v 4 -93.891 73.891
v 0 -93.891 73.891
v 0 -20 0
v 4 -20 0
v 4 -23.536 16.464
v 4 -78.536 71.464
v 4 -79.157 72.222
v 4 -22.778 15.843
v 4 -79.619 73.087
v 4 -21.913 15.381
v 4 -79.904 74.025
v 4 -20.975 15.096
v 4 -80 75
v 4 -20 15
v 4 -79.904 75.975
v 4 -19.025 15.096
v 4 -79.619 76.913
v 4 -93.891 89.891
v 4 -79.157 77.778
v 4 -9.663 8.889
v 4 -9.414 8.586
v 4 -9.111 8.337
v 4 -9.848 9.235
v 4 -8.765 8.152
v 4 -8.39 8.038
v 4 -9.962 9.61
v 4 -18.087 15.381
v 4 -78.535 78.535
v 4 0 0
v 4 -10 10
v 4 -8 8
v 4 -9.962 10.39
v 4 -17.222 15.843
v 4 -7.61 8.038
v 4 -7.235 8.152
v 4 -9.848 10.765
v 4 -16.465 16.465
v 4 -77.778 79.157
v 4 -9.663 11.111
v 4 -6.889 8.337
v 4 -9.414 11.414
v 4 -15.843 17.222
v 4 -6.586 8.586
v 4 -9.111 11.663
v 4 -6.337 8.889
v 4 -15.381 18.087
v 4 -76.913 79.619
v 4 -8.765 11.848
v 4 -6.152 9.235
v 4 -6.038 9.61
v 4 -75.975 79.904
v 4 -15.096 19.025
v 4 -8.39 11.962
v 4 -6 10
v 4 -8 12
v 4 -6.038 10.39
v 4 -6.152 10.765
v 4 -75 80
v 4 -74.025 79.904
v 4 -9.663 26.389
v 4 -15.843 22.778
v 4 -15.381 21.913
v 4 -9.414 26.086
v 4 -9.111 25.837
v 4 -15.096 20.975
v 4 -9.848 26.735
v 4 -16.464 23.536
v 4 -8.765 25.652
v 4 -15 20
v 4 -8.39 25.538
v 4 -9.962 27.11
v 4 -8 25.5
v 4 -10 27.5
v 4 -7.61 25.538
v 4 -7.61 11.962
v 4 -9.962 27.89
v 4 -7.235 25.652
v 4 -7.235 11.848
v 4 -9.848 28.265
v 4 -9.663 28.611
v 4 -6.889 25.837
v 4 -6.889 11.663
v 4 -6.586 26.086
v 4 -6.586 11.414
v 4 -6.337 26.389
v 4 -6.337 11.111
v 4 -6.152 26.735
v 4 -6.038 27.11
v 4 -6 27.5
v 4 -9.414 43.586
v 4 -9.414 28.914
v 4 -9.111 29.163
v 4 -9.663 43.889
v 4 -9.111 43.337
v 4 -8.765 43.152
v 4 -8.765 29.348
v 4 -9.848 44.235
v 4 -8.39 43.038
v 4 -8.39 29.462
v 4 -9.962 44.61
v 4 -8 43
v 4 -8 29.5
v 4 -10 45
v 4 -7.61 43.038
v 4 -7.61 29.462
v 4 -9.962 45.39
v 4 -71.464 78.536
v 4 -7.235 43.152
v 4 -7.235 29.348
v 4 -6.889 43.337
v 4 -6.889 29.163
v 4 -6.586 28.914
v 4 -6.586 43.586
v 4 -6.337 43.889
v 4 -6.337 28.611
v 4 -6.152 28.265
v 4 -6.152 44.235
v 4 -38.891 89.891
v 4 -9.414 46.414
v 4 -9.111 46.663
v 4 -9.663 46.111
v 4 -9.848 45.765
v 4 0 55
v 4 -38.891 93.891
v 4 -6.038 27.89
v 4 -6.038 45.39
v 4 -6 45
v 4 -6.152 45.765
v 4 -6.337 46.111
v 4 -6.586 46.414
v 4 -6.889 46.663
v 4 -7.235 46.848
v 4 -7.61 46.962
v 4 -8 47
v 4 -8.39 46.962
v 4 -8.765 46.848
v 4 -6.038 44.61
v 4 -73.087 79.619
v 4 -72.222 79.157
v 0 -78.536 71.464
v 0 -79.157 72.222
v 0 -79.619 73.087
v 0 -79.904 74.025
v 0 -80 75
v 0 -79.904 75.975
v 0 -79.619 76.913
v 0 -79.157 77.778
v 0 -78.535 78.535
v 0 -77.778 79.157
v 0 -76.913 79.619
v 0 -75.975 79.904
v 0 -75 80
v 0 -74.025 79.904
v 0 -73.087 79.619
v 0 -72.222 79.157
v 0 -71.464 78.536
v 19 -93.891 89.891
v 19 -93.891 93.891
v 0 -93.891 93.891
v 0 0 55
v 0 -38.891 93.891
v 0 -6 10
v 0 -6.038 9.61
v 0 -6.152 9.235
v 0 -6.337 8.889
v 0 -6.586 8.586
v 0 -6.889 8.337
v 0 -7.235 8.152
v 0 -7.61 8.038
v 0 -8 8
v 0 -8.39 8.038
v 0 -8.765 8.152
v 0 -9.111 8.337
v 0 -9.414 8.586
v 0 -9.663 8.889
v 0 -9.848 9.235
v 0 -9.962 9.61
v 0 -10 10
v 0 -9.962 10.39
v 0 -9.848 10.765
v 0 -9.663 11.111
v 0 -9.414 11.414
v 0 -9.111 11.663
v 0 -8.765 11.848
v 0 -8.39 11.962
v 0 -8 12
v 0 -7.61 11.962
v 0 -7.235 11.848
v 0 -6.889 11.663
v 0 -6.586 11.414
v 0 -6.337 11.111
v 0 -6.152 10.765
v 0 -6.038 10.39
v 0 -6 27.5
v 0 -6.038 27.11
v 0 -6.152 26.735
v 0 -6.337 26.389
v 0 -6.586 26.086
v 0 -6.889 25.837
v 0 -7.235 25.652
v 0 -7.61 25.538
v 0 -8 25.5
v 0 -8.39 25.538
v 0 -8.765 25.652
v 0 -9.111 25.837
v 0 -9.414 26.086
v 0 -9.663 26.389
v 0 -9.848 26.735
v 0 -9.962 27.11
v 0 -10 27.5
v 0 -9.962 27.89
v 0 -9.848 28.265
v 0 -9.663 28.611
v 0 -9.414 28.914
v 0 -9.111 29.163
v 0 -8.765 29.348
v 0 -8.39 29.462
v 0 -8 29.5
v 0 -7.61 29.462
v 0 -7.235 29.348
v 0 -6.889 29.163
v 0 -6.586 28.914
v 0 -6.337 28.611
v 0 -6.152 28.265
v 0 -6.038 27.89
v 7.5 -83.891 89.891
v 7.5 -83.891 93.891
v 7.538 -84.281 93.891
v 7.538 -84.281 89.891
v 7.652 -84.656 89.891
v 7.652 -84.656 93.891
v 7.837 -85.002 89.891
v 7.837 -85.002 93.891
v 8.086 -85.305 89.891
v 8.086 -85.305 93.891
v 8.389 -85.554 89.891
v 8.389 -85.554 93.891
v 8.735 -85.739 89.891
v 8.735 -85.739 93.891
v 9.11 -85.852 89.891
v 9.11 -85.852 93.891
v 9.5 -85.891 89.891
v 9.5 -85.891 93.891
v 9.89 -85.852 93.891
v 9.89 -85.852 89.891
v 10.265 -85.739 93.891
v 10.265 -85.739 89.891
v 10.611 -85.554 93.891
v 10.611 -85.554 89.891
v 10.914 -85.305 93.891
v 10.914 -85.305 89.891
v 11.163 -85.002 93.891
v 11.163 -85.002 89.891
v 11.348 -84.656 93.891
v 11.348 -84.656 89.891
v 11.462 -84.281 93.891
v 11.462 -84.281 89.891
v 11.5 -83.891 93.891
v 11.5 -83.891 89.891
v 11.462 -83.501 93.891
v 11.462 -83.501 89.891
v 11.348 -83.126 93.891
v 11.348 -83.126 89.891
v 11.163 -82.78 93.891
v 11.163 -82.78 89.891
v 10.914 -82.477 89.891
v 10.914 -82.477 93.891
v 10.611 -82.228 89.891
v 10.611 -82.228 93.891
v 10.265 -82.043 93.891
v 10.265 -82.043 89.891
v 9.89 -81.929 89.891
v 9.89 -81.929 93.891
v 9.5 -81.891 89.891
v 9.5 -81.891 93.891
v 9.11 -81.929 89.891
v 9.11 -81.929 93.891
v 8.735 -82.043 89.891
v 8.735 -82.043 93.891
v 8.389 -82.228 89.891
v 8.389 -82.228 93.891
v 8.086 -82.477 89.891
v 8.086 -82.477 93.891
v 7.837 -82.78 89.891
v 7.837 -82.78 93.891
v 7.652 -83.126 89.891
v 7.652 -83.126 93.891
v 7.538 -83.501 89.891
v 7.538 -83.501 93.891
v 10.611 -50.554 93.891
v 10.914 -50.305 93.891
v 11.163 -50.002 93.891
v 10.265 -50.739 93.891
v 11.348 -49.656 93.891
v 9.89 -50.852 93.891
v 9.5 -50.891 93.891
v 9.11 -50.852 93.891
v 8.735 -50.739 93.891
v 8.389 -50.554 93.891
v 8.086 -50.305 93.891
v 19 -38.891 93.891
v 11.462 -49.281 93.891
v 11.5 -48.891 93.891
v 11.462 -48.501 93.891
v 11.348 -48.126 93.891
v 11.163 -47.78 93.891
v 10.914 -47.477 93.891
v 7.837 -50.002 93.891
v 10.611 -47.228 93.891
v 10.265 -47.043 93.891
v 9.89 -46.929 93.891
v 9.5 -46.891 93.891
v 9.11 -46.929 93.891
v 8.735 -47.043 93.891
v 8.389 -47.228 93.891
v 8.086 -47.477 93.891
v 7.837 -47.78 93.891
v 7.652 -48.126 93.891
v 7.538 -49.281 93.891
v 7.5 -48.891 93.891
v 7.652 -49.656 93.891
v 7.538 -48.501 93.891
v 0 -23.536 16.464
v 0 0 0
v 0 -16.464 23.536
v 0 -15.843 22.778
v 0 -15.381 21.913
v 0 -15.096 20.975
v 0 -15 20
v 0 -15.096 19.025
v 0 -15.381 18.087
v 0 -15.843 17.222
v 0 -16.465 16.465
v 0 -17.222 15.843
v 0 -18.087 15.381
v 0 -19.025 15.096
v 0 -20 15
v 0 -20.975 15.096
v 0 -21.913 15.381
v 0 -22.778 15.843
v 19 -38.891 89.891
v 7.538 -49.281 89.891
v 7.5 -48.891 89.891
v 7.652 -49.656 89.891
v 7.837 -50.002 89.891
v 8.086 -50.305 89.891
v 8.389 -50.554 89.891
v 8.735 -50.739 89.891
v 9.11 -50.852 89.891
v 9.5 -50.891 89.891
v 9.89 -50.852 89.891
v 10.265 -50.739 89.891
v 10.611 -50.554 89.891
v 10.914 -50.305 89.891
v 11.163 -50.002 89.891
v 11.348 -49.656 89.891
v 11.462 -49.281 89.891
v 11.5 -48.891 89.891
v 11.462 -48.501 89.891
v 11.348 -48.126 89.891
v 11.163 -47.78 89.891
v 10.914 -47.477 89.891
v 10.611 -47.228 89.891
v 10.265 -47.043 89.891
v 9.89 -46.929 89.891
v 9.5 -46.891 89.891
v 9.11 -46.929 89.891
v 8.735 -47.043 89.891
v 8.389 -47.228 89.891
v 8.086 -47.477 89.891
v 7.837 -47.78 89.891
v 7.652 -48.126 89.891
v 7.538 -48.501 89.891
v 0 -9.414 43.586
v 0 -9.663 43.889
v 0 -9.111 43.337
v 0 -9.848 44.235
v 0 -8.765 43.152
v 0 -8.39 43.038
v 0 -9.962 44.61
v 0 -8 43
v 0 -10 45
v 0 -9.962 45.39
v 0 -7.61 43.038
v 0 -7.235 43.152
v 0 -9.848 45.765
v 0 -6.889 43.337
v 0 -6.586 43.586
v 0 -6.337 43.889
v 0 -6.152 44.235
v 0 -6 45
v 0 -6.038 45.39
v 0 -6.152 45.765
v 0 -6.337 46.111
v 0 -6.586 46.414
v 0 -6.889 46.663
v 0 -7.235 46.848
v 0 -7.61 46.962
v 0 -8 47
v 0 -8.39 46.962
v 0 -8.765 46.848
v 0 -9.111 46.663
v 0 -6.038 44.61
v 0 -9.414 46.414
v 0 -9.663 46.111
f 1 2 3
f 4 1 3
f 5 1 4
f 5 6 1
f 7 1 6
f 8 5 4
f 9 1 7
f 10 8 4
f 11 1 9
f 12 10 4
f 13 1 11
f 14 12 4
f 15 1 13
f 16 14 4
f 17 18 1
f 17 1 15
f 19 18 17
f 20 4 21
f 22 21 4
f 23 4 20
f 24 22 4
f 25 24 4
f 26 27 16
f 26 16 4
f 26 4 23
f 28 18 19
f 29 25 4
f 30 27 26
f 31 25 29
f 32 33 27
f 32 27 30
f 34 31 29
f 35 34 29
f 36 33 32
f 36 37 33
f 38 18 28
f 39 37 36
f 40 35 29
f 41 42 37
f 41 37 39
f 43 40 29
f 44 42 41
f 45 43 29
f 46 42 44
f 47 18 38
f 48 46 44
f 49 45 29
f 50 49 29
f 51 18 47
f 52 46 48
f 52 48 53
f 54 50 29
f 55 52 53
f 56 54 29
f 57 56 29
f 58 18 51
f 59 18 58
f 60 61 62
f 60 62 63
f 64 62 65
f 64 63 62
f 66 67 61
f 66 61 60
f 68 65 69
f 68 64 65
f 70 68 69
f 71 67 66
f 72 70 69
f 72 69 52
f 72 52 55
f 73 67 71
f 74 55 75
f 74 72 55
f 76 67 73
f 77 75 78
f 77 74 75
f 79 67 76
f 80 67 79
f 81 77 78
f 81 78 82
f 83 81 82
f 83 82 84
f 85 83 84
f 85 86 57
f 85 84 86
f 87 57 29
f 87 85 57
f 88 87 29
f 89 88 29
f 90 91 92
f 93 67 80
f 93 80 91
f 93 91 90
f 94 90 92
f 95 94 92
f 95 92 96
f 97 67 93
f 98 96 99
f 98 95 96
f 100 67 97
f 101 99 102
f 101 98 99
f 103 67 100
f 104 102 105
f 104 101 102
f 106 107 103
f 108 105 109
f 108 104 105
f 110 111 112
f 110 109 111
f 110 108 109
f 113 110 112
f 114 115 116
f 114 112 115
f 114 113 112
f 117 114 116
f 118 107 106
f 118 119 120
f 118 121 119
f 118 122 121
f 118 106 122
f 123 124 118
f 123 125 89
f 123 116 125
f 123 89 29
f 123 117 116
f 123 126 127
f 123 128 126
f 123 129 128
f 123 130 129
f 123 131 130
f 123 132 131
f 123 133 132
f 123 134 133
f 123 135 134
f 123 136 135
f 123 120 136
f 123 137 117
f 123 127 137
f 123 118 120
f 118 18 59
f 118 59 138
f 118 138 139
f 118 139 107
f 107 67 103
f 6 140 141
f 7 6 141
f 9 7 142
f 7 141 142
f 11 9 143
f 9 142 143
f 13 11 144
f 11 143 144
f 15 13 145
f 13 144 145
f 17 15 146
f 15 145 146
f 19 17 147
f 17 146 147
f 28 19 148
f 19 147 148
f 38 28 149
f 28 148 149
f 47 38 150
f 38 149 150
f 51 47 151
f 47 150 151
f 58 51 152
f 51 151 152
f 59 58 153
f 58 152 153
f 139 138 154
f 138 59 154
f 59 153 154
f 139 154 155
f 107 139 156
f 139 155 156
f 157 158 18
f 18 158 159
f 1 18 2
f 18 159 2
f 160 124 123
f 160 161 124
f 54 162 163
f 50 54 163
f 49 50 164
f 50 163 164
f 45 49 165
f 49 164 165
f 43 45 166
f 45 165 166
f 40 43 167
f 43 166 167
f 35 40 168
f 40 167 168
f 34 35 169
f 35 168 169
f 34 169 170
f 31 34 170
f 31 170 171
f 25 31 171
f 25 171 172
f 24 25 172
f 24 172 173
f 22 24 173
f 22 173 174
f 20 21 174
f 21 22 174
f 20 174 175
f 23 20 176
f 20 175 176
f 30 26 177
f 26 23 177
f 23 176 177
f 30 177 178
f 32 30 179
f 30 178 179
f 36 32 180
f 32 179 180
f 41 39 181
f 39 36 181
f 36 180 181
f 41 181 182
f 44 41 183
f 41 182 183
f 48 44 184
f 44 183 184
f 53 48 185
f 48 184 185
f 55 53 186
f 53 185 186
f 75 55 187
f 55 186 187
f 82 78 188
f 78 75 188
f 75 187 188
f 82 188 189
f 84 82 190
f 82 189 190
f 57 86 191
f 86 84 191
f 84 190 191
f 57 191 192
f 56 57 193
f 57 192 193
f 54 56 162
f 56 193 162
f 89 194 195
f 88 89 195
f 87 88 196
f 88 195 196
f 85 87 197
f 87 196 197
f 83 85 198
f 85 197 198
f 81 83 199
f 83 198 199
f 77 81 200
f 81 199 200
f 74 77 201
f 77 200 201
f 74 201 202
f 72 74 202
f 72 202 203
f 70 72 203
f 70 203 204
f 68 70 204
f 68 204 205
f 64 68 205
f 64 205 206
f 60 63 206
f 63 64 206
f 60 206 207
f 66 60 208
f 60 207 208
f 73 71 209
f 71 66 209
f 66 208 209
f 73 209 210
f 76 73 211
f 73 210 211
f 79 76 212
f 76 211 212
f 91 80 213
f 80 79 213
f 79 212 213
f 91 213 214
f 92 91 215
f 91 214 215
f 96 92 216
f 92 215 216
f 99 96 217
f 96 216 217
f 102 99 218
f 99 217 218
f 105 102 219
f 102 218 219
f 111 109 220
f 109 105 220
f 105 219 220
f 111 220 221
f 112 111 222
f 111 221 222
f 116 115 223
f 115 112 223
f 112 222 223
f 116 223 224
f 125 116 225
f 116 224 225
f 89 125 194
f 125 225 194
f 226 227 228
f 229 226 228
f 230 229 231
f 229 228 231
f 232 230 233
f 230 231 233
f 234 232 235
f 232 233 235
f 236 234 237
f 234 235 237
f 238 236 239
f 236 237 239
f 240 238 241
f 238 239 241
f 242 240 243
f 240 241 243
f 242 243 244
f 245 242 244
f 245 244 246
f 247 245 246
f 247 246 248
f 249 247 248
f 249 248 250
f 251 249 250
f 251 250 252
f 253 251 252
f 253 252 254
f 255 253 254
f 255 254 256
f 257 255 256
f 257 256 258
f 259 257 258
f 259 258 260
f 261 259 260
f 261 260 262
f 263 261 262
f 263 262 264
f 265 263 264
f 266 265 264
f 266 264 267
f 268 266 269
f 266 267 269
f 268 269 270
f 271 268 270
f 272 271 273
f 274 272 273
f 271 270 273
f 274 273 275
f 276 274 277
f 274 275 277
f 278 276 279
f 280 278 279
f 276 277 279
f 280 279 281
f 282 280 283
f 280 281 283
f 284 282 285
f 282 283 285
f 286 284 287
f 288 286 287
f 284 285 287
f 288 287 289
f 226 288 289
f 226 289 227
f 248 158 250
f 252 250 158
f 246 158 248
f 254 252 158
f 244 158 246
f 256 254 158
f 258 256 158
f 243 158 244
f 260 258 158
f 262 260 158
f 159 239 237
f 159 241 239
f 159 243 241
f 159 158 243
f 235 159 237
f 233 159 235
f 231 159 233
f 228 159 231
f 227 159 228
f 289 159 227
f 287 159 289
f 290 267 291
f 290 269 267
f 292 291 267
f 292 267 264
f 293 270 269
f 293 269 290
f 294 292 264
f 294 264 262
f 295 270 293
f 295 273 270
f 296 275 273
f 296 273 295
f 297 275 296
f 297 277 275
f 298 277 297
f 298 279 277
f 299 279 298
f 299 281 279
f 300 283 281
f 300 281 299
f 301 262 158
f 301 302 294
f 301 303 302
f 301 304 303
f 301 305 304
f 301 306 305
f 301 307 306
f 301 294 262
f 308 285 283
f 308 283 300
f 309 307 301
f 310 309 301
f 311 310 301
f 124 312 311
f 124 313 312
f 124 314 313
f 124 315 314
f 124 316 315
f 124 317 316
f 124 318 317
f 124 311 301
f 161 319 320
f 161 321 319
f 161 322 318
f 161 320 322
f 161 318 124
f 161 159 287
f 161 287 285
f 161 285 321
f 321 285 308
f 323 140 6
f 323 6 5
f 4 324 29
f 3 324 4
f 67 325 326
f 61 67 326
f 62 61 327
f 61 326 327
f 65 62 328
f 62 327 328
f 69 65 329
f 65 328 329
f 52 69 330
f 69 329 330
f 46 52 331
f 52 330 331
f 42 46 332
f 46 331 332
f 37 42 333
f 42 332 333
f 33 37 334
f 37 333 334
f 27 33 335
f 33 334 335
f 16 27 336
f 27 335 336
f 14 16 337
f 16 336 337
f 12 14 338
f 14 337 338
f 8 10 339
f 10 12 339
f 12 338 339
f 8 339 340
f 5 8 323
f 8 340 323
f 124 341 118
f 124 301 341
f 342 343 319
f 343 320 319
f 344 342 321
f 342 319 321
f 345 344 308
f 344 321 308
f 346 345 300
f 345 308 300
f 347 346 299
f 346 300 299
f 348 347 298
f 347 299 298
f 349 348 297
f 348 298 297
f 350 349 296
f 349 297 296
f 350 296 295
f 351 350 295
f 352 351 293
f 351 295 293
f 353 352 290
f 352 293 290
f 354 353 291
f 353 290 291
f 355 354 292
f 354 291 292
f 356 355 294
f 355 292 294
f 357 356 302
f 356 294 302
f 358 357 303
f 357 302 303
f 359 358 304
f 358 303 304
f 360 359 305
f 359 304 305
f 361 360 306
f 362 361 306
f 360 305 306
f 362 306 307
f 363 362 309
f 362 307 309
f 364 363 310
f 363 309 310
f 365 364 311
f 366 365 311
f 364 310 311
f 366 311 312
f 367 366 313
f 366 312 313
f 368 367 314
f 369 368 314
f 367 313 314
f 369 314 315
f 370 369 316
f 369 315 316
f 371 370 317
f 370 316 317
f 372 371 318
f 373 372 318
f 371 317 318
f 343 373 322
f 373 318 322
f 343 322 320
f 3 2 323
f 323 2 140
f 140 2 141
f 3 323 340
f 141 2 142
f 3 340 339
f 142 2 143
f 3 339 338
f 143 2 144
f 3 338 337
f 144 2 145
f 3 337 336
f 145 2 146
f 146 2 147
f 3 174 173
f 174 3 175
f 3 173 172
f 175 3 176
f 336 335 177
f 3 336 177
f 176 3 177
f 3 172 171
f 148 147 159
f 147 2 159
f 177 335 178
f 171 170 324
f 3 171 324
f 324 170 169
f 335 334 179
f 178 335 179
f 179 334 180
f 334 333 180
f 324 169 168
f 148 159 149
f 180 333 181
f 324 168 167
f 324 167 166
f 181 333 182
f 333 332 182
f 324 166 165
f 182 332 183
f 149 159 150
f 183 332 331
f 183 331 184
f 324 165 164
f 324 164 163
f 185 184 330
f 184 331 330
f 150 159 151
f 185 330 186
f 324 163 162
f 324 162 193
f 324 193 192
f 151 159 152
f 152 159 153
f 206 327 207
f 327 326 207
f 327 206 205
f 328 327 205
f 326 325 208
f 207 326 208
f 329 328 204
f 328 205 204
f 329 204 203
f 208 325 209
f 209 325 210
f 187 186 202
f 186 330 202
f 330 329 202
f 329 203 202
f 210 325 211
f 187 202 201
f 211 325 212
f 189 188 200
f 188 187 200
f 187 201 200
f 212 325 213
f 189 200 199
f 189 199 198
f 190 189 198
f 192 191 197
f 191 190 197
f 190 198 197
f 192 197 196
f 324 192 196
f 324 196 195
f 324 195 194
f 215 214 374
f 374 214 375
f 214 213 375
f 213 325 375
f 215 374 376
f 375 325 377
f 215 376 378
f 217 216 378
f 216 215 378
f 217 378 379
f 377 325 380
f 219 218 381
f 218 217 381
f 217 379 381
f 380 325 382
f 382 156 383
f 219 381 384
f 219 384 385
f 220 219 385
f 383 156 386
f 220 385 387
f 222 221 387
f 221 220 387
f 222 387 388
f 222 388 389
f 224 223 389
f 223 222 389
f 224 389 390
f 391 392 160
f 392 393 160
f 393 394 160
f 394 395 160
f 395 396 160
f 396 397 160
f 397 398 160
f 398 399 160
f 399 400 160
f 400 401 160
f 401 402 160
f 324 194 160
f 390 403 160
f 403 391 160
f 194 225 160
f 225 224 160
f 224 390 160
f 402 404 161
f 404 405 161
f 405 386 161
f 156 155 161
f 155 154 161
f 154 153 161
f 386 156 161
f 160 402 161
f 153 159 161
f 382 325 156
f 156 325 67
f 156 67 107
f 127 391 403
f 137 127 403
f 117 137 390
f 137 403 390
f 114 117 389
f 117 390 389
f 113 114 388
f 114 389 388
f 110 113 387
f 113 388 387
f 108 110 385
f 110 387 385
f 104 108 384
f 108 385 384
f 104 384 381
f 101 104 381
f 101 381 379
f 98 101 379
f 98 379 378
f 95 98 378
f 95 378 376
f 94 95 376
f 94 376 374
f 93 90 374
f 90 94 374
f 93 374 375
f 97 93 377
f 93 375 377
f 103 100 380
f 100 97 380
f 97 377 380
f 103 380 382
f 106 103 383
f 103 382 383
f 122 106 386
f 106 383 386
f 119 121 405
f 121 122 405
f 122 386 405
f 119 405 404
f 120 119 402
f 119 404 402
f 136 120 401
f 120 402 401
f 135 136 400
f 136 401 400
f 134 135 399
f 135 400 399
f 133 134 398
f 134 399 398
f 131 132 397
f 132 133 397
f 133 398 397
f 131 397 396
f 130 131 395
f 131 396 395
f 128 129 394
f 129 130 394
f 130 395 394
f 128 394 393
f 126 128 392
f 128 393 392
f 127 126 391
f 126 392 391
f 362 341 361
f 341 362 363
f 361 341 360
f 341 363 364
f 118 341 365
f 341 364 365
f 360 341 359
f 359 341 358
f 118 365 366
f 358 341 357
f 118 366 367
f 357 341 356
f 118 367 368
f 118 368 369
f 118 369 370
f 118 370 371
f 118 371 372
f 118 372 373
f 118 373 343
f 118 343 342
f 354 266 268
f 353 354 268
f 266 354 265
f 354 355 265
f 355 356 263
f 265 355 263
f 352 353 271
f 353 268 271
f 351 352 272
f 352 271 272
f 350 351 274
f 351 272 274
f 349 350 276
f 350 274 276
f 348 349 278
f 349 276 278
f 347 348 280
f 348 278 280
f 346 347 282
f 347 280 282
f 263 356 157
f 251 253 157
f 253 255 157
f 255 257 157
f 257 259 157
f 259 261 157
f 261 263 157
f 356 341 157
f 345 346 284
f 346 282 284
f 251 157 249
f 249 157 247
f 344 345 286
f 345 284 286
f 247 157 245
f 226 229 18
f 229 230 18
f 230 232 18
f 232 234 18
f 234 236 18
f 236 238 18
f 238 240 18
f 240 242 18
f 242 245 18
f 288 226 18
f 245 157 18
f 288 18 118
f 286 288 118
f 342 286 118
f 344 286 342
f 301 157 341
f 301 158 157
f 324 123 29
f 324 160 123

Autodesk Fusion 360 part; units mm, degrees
sketch "Sketch4" plane through (0, 0, 0) normal (1, 0, 0) x (0, 1, 0)
  line L0 (-93.8909, 93.8909) -> (-38.8909, 93.8909)
  line L1 (-38.8909, 93.8909) -> (0, 55)
  line L2 (0, 55) -> (0, 0)
  line L3 (0, 0) -> (-20, 0)
  line L4 (-93.8909, 93.8909) -> (-93.8909, 73.8909)
  line L5 (-93.8909, 73.8909) -> (-20, 0)
  line L6 (-16.4645, 23.5355) -> (-71.4645, 78.5355)
  arc A0 (-71.4645, 78.5355) -> (-78.5355, 71.4645) centre (-75, 75) ccw
  line L7 (-78.5355, 71.4645) -> (-23.5355, 16.4645)
  arc A1 (-23.5355, 16.4645) -> (-16.4645, 23.5355) centre (-20, 20) ccw
  line L8 (-20, 20) -> (-75, 75) construction
  circle A2 centre (-8, 10) radius 2
  circle A3 centre (-8, 45) radius 2
  line L9 (-8, 45) -> (-8, 10) construction
  line L10 (0, 27.5) -> (-8, 27.5) construction
  circle A4 centre (-8, 27.5) radius 2
  dimension "d15" = 55
  dimension "d16" = 135
  dimension "d17" = 55
  dimension "d18" = 55
  dimension "d19" = 20
  dimension "d20" = 20
  dimension "d21" = 10
  dimension "d22" = 4
  dimension "d23" = 4
  dimension "d24" = 8
  dimension "d25" = 35
  dimension "d35" = 4
extrude "Extrude1" add sketch "Sketch4" along normal blind 4
sketch "Sketch5" plane through (0, 0, 93.8909) normal (0, 0, 1) x (-1, 0, 0)
  line L0 (0, 38.8909) -> (0, 93.8909)
  line L1 (0, 93.8909) -> (-4, 93.8909)
  line L2 (-4, 93.8909) -> (-4, 38.8909)
  line L3 (-4, 38.8909) -> (0, 38.8909)
  line L4 (0, 93.8909) -> (-19, 93.8909)
  line L5 (-19, 93.8909) -> (-19, 38.8909)
  line L6 (-19, 38.8909) -> (0, 38.8909)
  line L7 (0, 38.8909) -> (0, 93.8909)
  circle A0 centre (-9.5, 83.8909) radius 2
  circle A1 centre (-9.5, 48.8909) radius 2
  line L8 (-9.5, 83.8909) -> (-9.5, 48.8909) construction
  line L9 (-9.5, 66.3909) -> (0, 66.3909) construction
  line L10 (-9.5, 48.8909) -> (-9.5, 38.8909) construction
  dimension "d28" = 55
  dimension "d30" = 4
  dimension "d31" = 4
  dimension "d32" = 35
  dimension "d36" = 19
extrude "Extrude3" add sketch "Sketch5" against normal blind 4 contours L2 L4 L5 L6
